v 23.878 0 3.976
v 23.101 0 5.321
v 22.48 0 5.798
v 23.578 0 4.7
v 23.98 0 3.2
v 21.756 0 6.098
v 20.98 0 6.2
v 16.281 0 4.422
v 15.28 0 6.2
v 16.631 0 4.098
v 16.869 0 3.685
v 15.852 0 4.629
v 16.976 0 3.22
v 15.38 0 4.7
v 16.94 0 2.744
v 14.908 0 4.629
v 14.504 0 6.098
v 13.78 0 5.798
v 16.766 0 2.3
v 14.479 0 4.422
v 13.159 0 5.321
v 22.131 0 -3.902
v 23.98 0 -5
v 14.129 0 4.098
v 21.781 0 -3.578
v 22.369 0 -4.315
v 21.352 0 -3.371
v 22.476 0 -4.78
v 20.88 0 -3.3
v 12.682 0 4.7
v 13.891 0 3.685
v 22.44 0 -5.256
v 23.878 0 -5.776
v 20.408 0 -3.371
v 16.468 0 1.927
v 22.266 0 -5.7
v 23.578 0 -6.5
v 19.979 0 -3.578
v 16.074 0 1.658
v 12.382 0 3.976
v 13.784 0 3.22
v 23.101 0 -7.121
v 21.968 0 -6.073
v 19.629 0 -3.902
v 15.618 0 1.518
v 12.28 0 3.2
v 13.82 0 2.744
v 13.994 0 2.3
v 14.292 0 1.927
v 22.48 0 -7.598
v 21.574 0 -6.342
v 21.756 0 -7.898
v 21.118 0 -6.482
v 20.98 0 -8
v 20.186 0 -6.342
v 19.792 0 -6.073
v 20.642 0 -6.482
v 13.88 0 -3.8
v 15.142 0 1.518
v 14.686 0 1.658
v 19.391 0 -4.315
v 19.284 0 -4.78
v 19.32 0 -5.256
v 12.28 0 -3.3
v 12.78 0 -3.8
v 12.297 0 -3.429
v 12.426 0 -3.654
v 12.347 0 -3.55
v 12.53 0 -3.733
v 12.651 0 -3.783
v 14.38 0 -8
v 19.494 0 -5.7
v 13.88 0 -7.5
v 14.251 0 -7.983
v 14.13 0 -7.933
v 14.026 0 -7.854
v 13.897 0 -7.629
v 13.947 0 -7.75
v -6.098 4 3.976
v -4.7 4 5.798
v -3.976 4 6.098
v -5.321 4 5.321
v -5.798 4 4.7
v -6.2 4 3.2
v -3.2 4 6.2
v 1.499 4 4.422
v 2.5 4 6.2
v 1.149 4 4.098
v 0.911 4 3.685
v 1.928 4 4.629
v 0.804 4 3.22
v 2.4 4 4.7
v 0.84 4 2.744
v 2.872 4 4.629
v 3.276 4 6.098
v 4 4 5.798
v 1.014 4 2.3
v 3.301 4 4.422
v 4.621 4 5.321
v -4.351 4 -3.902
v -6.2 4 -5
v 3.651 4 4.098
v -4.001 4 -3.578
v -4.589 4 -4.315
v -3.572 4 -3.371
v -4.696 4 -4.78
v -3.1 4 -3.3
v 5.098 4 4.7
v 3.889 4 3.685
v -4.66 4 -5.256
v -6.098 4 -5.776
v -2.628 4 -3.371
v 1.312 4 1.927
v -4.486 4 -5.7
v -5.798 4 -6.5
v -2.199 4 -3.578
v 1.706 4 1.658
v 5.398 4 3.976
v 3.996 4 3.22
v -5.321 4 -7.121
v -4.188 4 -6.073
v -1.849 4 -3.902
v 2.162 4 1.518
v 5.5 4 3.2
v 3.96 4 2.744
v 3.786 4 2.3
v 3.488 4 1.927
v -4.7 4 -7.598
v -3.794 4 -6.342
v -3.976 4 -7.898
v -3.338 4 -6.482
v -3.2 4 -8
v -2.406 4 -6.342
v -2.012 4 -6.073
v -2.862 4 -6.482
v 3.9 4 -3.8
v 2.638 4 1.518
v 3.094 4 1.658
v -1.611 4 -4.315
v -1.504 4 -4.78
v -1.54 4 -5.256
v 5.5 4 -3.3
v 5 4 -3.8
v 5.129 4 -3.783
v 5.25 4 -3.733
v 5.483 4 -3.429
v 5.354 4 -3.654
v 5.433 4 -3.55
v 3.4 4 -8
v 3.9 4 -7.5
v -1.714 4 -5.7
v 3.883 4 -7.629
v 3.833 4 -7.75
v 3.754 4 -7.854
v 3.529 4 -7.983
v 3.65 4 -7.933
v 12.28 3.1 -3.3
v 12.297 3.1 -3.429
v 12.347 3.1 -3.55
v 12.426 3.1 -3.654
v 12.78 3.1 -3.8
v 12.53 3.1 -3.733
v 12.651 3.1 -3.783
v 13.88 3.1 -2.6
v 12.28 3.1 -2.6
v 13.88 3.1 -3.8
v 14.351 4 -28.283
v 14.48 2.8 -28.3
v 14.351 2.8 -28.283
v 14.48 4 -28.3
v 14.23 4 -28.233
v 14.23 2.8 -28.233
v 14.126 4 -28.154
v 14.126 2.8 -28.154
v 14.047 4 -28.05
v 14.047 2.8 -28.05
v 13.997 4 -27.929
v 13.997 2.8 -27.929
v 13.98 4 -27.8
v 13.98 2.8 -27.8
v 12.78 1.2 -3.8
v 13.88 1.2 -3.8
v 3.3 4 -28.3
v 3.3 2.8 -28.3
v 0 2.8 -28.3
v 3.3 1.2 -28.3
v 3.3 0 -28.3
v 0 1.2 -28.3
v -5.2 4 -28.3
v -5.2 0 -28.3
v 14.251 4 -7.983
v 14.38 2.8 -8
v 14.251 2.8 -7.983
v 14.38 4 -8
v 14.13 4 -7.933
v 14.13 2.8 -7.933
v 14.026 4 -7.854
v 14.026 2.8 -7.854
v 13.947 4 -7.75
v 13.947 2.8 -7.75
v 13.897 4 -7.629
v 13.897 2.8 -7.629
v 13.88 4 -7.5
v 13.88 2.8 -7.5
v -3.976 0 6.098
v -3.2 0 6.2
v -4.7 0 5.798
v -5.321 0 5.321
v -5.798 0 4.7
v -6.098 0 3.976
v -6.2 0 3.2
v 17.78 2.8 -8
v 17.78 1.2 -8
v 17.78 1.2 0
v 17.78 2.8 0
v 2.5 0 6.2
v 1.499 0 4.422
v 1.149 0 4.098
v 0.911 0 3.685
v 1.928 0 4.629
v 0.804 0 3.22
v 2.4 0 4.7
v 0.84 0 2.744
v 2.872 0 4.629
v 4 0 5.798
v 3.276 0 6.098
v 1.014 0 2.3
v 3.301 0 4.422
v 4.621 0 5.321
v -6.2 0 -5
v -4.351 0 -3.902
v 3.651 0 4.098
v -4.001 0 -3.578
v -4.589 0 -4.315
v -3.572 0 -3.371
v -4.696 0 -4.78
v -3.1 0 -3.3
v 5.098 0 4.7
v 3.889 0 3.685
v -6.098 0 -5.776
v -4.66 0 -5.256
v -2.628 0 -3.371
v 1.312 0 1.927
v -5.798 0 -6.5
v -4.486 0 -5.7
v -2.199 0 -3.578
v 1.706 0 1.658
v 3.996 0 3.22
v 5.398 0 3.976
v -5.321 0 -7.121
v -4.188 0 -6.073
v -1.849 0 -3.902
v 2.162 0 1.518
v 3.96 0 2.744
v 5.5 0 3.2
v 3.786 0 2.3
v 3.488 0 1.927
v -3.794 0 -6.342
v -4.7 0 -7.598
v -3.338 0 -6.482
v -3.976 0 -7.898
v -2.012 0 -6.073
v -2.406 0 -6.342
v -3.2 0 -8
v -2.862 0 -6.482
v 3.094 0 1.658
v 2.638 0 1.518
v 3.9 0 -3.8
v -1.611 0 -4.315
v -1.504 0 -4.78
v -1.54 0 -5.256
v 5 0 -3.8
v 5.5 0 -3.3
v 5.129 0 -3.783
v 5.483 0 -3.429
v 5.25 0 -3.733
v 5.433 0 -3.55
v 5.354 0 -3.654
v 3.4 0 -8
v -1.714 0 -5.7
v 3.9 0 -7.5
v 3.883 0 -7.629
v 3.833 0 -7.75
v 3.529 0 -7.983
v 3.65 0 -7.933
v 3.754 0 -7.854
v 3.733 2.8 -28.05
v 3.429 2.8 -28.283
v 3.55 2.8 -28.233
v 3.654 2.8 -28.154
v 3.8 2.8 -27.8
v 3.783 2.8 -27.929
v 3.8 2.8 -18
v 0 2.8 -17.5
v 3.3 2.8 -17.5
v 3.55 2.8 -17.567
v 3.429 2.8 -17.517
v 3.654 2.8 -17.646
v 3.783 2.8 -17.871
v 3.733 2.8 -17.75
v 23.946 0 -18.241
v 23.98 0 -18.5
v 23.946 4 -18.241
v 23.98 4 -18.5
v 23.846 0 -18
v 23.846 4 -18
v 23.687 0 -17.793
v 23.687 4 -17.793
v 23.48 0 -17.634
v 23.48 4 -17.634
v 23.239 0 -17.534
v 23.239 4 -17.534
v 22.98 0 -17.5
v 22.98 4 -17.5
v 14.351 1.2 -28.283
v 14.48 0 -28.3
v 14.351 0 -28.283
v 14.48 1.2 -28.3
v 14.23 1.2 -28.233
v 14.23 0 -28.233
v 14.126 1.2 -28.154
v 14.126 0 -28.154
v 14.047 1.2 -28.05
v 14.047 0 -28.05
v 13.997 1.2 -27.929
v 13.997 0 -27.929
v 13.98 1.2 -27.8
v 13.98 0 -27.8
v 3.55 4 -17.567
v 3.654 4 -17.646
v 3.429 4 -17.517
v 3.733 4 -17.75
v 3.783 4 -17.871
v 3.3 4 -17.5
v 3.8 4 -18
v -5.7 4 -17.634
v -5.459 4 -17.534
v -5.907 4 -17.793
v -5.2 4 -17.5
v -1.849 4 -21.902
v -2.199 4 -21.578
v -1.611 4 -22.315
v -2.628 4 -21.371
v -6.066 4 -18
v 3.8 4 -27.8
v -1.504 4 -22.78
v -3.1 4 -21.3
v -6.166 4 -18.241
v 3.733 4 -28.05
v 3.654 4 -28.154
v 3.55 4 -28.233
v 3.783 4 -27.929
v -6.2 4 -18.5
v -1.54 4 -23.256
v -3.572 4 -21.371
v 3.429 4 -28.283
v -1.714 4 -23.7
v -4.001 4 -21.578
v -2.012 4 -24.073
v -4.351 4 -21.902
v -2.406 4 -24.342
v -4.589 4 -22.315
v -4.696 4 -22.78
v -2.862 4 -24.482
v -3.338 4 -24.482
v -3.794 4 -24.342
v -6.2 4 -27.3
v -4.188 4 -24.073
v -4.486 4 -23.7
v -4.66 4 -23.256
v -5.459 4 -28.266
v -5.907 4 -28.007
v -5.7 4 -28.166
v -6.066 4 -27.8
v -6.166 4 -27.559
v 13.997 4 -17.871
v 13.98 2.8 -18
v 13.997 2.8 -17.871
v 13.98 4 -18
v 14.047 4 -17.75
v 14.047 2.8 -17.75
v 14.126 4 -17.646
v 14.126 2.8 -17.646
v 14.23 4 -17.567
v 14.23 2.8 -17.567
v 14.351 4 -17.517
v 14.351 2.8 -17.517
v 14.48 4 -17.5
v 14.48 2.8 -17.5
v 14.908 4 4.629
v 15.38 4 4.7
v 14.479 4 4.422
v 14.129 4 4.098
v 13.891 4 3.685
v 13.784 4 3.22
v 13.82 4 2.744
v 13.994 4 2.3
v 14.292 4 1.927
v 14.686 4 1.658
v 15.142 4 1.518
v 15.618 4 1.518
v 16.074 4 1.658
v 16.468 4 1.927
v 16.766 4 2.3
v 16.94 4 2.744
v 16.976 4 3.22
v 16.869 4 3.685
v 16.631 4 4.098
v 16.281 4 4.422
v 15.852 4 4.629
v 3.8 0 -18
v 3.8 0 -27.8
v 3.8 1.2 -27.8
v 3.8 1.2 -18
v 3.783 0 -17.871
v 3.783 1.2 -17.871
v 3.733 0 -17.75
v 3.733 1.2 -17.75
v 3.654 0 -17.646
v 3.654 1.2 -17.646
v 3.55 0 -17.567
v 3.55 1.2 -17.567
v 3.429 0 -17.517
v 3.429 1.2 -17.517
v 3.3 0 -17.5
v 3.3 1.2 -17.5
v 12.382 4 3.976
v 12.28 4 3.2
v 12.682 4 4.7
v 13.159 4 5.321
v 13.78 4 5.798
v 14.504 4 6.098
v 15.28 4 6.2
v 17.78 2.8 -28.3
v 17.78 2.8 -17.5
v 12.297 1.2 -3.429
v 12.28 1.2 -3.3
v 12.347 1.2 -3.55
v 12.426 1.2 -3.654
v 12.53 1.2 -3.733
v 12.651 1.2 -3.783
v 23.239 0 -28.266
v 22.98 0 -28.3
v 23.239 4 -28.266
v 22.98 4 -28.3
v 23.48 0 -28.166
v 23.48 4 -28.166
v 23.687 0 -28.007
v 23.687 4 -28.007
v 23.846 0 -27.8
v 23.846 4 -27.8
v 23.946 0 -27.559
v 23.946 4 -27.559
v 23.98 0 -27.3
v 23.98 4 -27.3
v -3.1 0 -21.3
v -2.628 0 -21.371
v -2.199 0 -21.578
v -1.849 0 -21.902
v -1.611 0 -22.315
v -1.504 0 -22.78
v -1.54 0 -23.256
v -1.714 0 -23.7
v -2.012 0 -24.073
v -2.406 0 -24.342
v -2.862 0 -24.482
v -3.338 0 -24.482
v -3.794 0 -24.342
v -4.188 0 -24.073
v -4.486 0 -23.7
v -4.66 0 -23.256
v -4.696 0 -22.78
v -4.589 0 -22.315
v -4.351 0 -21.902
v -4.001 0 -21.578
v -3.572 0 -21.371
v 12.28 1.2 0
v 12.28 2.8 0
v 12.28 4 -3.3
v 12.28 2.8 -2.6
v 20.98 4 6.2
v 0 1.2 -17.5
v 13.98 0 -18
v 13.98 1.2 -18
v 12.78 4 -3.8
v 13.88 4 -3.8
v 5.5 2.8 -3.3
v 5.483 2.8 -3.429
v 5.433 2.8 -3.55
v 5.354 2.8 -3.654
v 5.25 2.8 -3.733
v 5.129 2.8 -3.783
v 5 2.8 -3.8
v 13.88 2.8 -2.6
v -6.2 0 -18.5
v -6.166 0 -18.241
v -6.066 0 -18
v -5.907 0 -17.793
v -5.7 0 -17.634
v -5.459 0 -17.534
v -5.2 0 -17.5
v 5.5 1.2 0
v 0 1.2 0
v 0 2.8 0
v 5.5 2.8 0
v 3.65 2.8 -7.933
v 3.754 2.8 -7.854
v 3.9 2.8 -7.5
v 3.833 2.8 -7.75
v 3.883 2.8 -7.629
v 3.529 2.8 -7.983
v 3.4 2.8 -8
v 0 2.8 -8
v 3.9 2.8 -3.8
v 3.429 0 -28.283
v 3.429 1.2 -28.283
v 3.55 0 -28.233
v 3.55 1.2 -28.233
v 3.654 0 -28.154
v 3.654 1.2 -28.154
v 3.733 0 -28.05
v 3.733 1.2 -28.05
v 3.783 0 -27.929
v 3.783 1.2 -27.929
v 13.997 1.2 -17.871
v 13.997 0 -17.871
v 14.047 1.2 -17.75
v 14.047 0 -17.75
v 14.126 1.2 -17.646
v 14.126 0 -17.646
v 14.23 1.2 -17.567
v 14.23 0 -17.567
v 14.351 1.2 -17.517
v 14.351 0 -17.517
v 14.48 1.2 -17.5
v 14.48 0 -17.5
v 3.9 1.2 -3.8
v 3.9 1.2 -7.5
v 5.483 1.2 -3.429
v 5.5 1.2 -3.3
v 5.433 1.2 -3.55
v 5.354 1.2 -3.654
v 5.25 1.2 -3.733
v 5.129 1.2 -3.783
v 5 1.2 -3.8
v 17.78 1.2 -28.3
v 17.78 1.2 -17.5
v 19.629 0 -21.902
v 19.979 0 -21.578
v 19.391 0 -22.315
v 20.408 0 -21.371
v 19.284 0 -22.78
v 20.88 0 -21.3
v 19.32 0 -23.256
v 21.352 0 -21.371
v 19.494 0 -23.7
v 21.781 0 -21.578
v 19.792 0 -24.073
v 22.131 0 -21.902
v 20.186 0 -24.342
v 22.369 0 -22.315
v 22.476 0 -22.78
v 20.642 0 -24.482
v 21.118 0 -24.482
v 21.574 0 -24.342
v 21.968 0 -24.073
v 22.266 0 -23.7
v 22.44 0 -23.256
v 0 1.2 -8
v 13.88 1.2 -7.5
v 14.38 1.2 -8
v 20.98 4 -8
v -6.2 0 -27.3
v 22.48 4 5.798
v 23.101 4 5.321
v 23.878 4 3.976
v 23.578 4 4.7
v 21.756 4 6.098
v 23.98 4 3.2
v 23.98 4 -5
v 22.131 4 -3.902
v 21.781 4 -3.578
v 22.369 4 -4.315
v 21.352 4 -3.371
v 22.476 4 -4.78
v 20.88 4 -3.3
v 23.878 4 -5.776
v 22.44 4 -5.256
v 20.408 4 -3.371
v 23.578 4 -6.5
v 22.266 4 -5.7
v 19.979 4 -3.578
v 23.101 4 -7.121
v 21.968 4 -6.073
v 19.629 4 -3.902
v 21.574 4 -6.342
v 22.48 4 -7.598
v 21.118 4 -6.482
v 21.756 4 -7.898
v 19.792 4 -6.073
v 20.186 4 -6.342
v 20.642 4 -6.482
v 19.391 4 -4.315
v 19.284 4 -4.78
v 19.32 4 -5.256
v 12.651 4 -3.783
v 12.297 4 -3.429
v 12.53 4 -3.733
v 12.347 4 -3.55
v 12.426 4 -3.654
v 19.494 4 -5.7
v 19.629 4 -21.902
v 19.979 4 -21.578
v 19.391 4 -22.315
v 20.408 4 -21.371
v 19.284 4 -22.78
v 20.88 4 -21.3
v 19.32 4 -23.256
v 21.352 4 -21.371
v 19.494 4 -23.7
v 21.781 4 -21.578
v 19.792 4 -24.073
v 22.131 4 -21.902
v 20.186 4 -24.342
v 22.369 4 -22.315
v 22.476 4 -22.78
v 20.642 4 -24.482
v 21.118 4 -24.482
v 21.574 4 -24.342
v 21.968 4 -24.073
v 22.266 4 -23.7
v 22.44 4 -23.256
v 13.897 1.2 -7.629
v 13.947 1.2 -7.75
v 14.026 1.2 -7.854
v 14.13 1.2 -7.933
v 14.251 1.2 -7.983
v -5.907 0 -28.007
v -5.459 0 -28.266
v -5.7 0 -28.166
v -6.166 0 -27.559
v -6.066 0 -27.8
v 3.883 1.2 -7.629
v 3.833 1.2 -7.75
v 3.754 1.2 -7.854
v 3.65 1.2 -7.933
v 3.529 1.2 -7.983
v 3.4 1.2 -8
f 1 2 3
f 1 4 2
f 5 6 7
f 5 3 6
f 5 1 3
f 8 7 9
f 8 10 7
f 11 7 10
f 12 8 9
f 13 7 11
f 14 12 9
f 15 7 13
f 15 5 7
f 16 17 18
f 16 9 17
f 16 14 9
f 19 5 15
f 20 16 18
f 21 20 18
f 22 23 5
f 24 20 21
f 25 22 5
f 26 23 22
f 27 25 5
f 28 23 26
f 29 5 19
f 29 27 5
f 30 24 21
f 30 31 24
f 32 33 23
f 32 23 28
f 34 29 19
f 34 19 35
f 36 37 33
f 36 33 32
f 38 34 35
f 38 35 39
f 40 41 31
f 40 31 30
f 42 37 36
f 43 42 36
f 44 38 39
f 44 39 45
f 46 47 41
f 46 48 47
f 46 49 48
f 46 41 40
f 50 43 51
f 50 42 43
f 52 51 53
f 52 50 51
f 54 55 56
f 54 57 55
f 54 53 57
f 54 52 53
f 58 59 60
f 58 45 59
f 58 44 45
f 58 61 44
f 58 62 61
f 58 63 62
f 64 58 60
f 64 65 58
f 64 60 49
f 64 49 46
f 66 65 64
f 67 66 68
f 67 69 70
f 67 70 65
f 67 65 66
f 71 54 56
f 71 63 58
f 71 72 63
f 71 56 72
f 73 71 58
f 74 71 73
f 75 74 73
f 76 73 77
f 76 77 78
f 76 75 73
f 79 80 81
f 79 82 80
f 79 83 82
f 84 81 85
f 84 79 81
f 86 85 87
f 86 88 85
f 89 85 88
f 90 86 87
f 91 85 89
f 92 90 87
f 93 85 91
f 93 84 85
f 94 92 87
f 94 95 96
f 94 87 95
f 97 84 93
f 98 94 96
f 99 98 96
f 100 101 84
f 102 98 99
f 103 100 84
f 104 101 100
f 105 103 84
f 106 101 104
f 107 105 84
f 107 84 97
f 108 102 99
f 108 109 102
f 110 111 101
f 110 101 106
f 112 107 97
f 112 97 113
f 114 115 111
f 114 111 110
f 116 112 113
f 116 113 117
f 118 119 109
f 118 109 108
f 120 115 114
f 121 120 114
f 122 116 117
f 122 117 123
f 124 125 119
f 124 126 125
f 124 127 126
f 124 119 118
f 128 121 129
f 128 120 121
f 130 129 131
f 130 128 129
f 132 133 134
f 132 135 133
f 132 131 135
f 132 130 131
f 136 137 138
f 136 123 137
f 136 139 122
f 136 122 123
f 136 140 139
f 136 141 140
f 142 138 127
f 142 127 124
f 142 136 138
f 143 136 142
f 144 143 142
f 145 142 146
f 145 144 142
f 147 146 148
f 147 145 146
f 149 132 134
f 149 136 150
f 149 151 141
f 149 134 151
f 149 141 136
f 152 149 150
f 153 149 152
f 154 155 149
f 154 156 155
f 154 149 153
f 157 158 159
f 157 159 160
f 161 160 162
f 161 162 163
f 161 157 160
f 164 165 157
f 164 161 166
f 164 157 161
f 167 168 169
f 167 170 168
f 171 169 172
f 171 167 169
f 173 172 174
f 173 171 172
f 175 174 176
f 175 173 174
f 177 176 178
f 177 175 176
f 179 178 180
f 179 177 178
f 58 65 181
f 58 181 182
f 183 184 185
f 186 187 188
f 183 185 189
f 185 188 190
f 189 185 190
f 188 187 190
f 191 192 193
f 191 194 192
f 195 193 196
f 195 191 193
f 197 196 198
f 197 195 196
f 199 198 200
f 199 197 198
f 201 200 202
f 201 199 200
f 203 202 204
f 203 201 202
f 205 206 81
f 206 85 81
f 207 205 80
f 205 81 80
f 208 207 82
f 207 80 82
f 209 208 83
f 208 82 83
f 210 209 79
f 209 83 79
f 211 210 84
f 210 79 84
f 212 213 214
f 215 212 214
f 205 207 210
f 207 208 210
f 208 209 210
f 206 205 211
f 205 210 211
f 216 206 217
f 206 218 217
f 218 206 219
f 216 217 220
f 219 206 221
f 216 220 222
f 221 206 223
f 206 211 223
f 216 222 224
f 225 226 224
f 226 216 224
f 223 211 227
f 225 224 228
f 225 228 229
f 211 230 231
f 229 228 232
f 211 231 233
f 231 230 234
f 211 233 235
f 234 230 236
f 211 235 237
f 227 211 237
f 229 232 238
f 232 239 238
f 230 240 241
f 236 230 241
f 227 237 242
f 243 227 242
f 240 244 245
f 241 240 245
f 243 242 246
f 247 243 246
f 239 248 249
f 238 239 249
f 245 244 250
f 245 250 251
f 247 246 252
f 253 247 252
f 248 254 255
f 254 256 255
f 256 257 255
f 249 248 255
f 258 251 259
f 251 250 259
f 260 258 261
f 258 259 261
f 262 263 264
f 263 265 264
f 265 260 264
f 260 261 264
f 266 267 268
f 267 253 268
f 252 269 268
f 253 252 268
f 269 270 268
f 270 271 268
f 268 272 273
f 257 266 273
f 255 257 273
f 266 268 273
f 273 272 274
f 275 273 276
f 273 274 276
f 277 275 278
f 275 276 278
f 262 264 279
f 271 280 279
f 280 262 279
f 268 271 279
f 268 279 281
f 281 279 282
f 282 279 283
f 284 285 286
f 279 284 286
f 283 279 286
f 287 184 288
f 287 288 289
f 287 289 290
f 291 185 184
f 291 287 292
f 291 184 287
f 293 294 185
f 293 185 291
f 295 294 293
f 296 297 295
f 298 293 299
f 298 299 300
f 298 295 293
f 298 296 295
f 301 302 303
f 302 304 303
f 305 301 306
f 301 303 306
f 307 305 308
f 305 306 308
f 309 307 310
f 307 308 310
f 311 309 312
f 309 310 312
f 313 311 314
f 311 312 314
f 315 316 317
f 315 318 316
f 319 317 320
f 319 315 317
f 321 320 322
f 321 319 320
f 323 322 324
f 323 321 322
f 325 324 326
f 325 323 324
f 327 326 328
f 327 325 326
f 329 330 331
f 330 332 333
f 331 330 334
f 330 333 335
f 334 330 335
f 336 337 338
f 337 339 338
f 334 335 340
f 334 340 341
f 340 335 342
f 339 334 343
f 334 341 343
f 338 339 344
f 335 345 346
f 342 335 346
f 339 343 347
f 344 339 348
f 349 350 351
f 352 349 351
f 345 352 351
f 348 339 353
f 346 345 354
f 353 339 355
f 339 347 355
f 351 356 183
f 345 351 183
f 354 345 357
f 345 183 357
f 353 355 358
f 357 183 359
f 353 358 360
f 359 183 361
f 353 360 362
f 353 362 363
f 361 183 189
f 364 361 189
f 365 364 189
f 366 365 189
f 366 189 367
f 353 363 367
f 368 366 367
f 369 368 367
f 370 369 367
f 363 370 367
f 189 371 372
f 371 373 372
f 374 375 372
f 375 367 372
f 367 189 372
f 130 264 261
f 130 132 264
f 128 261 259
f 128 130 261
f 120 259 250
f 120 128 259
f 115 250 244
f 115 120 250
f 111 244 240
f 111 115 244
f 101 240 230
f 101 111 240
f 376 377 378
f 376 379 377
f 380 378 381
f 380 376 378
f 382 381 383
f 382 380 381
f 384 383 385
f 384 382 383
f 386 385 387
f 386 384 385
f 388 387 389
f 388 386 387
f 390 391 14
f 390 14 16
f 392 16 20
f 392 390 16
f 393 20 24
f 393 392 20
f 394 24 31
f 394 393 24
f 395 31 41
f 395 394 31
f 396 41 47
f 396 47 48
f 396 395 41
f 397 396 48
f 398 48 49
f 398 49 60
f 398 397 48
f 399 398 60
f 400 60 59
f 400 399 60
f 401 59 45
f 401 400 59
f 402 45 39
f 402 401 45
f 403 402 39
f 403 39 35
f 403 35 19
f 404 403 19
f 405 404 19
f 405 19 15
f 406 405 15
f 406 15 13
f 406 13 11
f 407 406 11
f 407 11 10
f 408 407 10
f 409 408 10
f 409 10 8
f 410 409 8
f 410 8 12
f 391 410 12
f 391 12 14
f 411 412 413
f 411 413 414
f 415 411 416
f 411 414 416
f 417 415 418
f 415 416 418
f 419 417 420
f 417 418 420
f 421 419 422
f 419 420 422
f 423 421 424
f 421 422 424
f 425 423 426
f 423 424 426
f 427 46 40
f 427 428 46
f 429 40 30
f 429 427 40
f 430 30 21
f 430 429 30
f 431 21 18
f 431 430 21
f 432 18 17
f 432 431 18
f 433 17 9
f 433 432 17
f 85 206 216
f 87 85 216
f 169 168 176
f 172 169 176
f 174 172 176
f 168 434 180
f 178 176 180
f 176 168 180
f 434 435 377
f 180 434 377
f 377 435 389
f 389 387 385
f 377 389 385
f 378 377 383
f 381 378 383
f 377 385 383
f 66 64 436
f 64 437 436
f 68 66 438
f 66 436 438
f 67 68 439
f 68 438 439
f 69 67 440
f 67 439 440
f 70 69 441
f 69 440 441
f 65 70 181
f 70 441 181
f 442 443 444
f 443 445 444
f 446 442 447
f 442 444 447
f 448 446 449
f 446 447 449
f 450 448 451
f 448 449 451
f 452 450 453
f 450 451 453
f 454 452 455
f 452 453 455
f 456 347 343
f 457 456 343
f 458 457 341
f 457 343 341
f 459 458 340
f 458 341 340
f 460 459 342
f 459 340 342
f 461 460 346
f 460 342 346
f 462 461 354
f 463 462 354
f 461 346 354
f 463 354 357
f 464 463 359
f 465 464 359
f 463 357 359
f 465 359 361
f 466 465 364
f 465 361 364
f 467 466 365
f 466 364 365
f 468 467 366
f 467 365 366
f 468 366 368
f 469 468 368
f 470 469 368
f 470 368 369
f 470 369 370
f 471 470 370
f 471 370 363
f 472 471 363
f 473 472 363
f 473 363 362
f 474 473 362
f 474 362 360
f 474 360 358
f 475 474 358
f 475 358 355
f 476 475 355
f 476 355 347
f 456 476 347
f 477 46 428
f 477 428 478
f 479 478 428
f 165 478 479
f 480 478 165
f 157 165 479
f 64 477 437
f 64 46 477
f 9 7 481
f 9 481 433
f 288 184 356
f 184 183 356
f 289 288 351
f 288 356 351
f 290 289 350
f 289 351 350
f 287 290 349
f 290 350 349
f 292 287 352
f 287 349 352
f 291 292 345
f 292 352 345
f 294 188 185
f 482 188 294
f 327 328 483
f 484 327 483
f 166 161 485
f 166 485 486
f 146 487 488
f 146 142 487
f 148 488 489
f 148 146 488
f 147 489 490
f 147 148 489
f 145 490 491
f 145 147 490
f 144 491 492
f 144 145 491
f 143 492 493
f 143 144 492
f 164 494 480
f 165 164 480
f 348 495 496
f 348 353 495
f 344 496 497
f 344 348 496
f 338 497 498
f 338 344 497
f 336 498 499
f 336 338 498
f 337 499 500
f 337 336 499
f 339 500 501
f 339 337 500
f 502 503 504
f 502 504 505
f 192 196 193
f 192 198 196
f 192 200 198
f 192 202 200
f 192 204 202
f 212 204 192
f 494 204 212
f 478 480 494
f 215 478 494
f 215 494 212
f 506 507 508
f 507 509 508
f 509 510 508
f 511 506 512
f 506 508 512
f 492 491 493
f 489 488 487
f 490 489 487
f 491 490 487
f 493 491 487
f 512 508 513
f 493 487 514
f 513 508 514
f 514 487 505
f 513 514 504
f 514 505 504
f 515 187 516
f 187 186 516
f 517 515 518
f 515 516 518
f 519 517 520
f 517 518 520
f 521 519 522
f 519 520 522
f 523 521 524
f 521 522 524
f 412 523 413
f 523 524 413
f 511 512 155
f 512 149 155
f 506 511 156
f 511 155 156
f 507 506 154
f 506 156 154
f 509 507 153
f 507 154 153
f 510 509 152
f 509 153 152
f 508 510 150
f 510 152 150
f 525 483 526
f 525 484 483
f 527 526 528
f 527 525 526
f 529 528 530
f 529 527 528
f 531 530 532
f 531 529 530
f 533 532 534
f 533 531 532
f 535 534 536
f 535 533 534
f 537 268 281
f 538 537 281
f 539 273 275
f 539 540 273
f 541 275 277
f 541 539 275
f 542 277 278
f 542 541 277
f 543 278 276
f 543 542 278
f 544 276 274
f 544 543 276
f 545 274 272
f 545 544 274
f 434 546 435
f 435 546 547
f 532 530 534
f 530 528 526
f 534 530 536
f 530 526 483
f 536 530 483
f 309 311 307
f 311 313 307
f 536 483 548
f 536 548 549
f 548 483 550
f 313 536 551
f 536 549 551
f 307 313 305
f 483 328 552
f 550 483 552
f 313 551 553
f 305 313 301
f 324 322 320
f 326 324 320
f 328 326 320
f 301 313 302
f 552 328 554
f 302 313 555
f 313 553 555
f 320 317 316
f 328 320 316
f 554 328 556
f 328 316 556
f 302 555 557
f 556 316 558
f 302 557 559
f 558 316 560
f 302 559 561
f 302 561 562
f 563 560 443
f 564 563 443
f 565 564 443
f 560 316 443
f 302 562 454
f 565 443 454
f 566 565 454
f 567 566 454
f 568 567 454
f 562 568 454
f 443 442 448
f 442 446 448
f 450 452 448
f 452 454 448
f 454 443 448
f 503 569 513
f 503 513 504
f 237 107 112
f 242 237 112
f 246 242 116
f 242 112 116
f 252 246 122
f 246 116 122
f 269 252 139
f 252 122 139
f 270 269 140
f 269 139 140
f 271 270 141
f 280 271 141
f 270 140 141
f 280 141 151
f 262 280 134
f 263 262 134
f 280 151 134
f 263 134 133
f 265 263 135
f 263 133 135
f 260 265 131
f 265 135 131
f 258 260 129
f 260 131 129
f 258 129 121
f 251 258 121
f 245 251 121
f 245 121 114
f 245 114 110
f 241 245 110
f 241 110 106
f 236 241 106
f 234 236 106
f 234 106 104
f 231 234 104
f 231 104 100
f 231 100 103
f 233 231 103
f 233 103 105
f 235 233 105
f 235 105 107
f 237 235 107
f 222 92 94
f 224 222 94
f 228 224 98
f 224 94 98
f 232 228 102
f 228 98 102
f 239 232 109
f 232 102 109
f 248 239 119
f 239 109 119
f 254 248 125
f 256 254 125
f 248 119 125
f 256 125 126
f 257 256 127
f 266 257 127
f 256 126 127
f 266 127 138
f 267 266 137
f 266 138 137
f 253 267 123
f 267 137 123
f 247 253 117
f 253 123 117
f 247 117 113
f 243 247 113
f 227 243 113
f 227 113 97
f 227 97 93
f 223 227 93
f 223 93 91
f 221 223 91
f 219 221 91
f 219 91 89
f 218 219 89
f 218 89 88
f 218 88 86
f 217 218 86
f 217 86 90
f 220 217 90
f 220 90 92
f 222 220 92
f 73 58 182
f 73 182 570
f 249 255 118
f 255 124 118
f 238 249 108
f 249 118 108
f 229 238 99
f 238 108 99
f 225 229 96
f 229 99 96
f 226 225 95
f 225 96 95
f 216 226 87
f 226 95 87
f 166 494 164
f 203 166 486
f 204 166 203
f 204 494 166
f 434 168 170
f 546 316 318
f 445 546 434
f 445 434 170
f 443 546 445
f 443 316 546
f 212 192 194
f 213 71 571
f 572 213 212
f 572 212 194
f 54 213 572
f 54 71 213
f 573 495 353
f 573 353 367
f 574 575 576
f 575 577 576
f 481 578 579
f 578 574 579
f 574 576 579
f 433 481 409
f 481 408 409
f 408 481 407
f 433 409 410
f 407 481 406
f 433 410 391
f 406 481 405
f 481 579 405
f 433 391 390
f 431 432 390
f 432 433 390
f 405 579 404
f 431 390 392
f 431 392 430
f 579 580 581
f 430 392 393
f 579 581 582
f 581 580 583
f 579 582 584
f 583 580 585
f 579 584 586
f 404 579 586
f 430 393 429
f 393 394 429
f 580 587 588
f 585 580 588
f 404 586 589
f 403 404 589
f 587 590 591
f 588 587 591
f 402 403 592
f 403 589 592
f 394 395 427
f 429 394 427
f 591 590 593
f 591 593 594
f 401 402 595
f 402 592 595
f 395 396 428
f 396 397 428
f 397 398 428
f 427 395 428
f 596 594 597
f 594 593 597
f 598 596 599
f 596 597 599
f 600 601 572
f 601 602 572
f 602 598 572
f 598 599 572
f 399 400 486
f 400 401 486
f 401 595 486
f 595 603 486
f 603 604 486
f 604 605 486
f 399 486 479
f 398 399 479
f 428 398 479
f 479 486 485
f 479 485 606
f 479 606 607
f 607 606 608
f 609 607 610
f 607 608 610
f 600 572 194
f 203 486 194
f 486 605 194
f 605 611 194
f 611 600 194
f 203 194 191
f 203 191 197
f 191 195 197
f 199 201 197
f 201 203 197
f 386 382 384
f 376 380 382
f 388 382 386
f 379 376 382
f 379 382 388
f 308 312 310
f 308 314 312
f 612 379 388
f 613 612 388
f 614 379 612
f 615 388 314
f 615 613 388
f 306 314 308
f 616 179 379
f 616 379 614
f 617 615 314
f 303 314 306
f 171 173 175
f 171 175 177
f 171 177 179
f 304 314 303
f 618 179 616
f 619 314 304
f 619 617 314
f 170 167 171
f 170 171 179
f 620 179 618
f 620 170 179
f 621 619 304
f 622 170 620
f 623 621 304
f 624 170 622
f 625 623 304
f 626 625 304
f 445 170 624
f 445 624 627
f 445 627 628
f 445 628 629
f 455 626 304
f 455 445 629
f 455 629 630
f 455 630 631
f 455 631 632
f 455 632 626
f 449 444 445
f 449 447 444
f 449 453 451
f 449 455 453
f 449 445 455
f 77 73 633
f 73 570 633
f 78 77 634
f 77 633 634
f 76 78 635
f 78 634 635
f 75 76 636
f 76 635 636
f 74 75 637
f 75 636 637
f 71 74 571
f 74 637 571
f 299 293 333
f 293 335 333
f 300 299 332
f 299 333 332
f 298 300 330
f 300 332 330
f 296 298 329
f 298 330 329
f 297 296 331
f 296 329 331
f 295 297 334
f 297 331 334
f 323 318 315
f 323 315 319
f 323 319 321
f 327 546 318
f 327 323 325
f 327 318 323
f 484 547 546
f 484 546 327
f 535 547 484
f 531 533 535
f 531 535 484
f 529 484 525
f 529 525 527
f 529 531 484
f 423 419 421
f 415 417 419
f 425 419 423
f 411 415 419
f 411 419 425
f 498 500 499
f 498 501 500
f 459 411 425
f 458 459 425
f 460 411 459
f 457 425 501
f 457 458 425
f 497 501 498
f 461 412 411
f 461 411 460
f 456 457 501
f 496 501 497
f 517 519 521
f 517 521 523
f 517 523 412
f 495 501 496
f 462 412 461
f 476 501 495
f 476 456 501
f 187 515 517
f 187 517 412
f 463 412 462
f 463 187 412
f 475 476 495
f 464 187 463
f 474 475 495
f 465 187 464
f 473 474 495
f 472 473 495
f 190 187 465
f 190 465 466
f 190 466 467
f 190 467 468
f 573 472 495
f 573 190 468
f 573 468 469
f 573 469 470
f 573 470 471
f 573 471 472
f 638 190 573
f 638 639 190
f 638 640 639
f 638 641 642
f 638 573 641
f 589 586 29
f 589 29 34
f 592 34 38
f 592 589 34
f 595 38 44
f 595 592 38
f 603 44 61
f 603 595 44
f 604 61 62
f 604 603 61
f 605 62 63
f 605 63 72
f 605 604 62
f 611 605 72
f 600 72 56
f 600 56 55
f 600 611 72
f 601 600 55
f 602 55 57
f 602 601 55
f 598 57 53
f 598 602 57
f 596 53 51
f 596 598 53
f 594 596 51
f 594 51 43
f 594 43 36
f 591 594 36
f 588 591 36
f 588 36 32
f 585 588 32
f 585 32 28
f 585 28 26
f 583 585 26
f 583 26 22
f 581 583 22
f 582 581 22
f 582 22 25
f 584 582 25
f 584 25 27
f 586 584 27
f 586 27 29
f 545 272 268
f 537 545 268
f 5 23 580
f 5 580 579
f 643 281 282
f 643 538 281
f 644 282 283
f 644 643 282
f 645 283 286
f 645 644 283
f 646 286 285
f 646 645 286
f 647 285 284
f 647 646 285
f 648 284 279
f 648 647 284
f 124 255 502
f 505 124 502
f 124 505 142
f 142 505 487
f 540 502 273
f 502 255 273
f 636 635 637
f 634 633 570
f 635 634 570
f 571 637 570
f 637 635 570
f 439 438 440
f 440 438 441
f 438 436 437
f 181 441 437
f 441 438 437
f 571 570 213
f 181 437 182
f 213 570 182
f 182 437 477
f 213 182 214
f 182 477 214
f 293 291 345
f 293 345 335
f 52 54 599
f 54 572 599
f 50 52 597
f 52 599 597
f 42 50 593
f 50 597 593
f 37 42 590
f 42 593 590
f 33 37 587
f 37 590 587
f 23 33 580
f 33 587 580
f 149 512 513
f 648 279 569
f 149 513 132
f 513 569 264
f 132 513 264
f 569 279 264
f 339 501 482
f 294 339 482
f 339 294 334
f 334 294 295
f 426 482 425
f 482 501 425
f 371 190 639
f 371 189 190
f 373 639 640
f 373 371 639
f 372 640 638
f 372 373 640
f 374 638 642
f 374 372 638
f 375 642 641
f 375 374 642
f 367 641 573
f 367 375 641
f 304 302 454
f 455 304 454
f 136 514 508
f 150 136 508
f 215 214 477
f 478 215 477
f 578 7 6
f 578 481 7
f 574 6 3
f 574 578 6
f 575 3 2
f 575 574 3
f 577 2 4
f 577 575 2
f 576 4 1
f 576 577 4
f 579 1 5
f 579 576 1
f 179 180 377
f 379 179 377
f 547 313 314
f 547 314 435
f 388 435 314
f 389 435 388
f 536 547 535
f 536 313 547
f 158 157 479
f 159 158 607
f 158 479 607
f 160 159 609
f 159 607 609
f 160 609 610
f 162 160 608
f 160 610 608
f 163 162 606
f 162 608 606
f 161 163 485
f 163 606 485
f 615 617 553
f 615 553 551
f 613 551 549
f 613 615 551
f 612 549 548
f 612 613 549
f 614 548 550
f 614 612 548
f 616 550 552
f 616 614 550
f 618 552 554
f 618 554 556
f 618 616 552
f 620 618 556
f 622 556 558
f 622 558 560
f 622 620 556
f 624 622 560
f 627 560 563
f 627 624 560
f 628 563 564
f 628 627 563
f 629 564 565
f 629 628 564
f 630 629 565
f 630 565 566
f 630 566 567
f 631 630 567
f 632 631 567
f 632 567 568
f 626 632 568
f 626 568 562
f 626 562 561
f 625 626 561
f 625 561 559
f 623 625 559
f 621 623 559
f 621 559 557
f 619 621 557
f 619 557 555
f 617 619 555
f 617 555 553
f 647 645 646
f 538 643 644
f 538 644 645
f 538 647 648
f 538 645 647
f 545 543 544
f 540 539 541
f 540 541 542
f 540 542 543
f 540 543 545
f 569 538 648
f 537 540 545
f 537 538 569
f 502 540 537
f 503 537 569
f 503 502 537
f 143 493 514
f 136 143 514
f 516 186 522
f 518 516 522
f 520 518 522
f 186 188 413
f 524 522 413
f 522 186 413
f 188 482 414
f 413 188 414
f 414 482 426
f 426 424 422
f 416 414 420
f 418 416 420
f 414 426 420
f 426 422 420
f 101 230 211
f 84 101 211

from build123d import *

# Parameters (mm, degrees)
SKETCH1_R           = 1
BOSS_EXTRUDE1_DEPTH = 4
CUT_EXTRUDE1_START  = -1.2
CUT_EXTRUDE1_DEPTH  = 1.6
SKETCH3_R           = 1.6
CUT_EXTRUDE2_DEPTH  = 11.883014288
FILLET1_R           = 3
FILLET2_R           = 0.5
SKETCH5_R           = 1
BOSS_EXTRUDE2_DEPTH = 4
SKETCH7_R           = 1.6
CUT_EXTRUDE4_DEPTH  = 30.246025371
CUT_EXTRUDE5_START  = -1.2
SKETCH8_W           = 3.8
SKETCH8_H           = 10.8
CUT_EXTRUDE5_DEPTH  = 1.6
FILLET3_R           = 0.5
FILLET4_R           = 1
CUT_EXTRUDE3_DEPTH  = 0.3


with BuildPart() as part:
    # Sketch1 → Boss-Extrude1 (new body)
    with BuildSketch(Plane(origin=(0, 0, 0), x_dir=(1, 0, 0), z_dir=(0, 1, 0))):
        Polygon((5.5, 0), (5.5, 3.8), (3.9, 3.8), (3.9, 8), (0, 8), (-6.2, 8), (-6.2, -6.2), (5.5, -6.2), align=None)
        with Locations(Location((-3.1, 4.9, 0), (0, 0, 270))):
            Circle(SKETCH1_R, mode=Mode.SUBTRACT)
        with Locations(Location((2.4, -3.1, 0), (0, 0, 270))):
            Circle(SKETCH1_R, mode=Mode.SUBTRACT)
    extrude(amount=BOSS_EXTRUDE1_DEPTH)

    # Sketch2 → Cut-Extrude1 (cut)
    with BuildSketch(Plane.XZ.offset(CUT_EXTRUDE1_START)):
        Polygon((0, 0), (5.5, 0), (5.5, -3.8), (3.9, -3.8), (3.9, -8), (0, -8), align=None)
    extrude(amount=-CUT_EXTRUDE1_DEPTH, mode=Mode.SUBTRACT)

    # Sketch3 → Cut-Extrude2 (cut, through all)
    with BuildSketch(Plane(origin=(0, 4, 0), x_dir=(1, 0, 0), z_dir=(0, 1, 0))):
        with Locations(Location((2.4, -3.1, 0), (0, 0, 270))):
            Circle(SKETCH3_R)
        with Locations(Location((-3.1, 4.9, 0), (0, 0, 270))):
            Circle(SKETCH3_R)
    extrude(amount=-CUT_EXTRUDE2_DEPTH, mode=Mode.SUBTRACT)

    # Fillet1
    fillet1_edges = [part.edges().sort_by_distance(p)[0] for p in [
        (5.5, 2, 6.2),
        (-6.2, 2, 6.2),
        (-6.2, 2, -8),
    ]]
    fillet(fillet1_edges, radius=FILLET1_R)

    # Fillet2
    fillet2_edges = [part.edges().sort_by_distance(p)[0] for p in [
        (3.9, 3.4, -8),
        (5.5, 3.4, -3.8),
        (3.9, 0.6, -8),
        (5.5, 0.6, -3.8),
    ]]
    fillet(fillet2_edges, radius=FILLET2_R)


with BuildPart() as body_2:
    # Sketch5 → Boss-Extrude2 (new body)
    with BuildSketch(Plane(origin=(0, 0, 0), x_dir=(1, 0, 0), z_dir=(0, 1, 0))):
        Polygon((0, 28.3), (3.8, 28.3), (3.8, 17.5), (0, 17.5), (-6.2, 17.5), (-6.2, 28.3), align=None)
        with Locations(Location((-3.1, 22.9, 0), (0, 0, 90))):
            Circle(SKETCH5_R, mode=Mode.SUBTRACT)
    extrude(amount=BOSS_EXTRUDE2_DEPTH)

    # Sketch7 → Cut-Extrude4 (cut, through all)
    with BuildSketch(Plane(origin=(0, 4, 0), x_dir=(1, 0, 0), z_dir=(0, 1, 0))):
        with Locations(Location((-3.1, 22.9, 0), (0, 0, 270))):
            Circle(SKETCH7_R)
    extrude(amount=-CUT_EXTRUDE4_DEPTH, mode=Mode.SUBTRACT)

    # Sketch8 → Cut-Extrude5 (cut)
    with BuildSketch(Plane.XZ.offset(CUT_EXTRUDE5_START)):
        with Locations((1.9, -22.9)):
            Rectangle(SKETCH8_W, SKETCH8_H)
    extrude(amount=-CUT_EXTRUDE5_DEPTH, mode=Mode.SUBTRACT)

    # Fillet3
    fillet3_edges = [body_2.edges().sort_by_distance(p)[0] for p in [
        (3.8, 3.4, -28.3),
        (3.8, 3.4, -17.5),
        (3.8, 0.6, -17.5),
        (3.8, 0.6, -28.3),
    ]]
    fillet(fillet3_edges, radius=FILLET3_R)

    # Fillet4
    fillet4_edges = [body_2.edges().sort_by_distance(p)[0] for p in [
        (-6.2, 2, -28.3),
        (-6.2, 2, -17.5),
    ]]
    fillet(fillet4_edges, radius=FILLET4_R)


with BuildPart() as body_3:
    # Mirror2: mirrored copy
    add(part.part.mirror(Plane(origin=(8.89, 0, 0), x_dir=(0, 0, 1), z_dir=(1, 0, 0))))

    # Sketch4 → Cut-Extrude3 (cut)
    with BuildSketch(Plane.XZ.offset(-2.8)):
        with BuildLine():
            Line((13.88, -3.8), (13.88, -2.6))
            Line((13.88, -2.6), (12.28, -2.6))
            Line((12.28, -2.6), (12.28, -3.3))
            ThreePointArc((12.28, -3.3), (12.426446609, -3.653553391), (12.78, -3.8))
            Line((12.78, -3.8), (13.88, -3.8))
        make_face()
    extrude(amount=-CUT_EXTRUDE3_DEPTH, mode=Mode.SUBTRACT)


with BuildPart() as body_4:
    # Mirror2 2: mirrored copy
    add(body_2.part.mirror(Plane(origin=(8.89, 0, 0), x_dir=(0, 0, 1), z_dir=(1, 0, 0))))


solid = Compound([part.part, body_2.part, body_3.part, body_4.part])
